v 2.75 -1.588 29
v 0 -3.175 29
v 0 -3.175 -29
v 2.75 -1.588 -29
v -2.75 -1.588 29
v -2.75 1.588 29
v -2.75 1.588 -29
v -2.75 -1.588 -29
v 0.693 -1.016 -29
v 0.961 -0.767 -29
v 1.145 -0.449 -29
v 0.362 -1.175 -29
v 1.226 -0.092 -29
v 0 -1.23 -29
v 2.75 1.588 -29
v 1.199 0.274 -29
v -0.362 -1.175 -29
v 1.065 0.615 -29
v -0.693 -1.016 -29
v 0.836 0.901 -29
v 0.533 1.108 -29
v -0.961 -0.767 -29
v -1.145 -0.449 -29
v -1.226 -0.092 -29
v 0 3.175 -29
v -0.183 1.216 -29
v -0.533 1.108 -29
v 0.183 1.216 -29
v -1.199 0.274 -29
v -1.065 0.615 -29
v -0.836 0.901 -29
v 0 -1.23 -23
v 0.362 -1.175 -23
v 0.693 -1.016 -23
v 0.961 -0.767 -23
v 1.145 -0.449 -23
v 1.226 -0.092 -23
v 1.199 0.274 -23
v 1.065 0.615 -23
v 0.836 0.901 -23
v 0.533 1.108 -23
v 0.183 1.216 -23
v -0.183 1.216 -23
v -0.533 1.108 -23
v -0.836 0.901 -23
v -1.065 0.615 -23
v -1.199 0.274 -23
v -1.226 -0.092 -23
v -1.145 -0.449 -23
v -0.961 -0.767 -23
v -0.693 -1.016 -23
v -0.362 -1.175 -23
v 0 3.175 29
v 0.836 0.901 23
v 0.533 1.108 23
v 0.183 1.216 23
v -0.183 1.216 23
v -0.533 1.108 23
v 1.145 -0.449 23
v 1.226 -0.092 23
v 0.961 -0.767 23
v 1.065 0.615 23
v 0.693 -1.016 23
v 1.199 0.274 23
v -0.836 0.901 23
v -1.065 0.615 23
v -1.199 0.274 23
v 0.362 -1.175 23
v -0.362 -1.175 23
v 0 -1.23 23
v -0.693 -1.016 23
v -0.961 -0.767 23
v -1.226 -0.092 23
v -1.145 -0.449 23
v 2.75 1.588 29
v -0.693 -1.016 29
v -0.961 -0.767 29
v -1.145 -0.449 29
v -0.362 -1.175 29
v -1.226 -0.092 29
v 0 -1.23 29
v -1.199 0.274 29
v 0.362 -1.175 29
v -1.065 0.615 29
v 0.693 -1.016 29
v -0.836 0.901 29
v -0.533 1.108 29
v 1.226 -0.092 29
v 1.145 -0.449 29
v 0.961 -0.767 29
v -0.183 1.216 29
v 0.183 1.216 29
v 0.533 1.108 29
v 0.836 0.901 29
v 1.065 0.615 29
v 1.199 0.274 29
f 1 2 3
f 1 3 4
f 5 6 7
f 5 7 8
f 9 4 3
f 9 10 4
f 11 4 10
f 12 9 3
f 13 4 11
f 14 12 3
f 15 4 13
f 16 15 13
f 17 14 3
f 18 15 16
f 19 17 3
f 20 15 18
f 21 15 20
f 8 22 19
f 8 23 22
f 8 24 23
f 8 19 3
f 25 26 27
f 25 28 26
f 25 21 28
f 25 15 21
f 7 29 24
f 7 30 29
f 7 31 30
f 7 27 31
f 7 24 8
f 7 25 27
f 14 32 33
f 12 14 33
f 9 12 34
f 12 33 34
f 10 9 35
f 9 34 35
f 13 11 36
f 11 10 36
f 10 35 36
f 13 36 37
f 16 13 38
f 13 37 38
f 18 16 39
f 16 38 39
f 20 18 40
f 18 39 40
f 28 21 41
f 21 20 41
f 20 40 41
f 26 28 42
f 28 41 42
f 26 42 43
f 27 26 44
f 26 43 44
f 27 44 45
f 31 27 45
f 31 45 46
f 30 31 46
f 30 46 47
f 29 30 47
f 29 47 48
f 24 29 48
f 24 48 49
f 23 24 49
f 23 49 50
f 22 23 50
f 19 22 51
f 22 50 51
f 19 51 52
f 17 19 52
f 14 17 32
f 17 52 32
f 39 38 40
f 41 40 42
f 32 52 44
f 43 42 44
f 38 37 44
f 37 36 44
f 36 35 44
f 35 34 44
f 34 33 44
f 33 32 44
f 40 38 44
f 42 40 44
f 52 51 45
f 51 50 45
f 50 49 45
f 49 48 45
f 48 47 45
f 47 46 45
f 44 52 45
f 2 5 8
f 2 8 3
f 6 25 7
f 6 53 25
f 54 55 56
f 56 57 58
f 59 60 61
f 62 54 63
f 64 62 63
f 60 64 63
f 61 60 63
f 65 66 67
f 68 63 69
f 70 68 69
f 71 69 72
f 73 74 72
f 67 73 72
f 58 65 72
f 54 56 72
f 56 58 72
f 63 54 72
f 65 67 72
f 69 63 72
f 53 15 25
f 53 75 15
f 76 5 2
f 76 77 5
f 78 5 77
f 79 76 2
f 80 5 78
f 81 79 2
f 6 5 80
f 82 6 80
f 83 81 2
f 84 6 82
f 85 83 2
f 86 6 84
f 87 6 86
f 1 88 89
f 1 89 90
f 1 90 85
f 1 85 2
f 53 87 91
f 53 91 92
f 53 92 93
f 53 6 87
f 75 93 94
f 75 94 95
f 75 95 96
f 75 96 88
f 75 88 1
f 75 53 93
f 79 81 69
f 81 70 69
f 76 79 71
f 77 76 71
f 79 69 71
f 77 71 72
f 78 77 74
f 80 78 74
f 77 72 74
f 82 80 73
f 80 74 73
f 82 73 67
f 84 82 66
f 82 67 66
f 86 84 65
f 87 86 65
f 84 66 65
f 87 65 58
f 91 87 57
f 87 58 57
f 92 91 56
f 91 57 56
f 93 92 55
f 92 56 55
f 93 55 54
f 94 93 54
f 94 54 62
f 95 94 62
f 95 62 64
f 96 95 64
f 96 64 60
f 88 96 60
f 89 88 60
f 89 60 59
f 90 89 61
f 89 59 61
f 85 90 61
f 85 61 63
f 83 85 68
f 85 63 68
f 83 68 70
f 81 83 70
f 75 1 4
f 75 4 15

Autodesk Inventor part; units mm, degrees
ref_plane "YZ Plane" through (0, 0, 0) normal (1, 0, 0) x (0, 1, 0)
ref_plane "XZ Plane" through (0, 0, 0) normal (0, 1, 0) x (-1, 0, 0)
ref_plane "XY Plane" through (0, 0, 0) normal (0, 0, 1) x (1, 0, 0)
sketch "スケッチ1" plane through (0, 0, 0) normal (0, 0, 1) x (1, 0, 0)
  line L0 (2.75, 1.5877) -> (2.75, -1.5877)
  line L1 (2.75, -1.5877) -> (0, -3.1754)
  line L2 (0, -3.1754) -> (-2.75, -1.5877)
  line L3 (-2.75, -1.5877) -> (-2.75, 1.5877)
  line L4 (-2.75, 1.5877) -> (0, 3.1754)
  line L5 (0, 3.1754) -> (2.75, 1.5877)
  point P0 (0, 0)
  point P1 (0, 0)
  dimension "d0" = 5.5
extrude "押し出し1" add sketch "スケッチ1" along normal blind 29
sketch "スケッチ2" plane through (0, 0, 29) normal (0, 0, 1) x (1, 0, 0)
  point P0 (0, 0)
  point P1 (0, 0)
hole "穴1" at (0, 0, 29) direction (0, 0, -1) diameter 2.459 depth 6 thread size "M3x0.5" class "6H" standard "ISO Metric profile"
mirror "ミラー1" about plane through (0, 0, 0) normal (0, 0, -1) of "押し出し1", "穴1"
properties part number "ASU-340" material "ステンレス鋼 AISI 304"
